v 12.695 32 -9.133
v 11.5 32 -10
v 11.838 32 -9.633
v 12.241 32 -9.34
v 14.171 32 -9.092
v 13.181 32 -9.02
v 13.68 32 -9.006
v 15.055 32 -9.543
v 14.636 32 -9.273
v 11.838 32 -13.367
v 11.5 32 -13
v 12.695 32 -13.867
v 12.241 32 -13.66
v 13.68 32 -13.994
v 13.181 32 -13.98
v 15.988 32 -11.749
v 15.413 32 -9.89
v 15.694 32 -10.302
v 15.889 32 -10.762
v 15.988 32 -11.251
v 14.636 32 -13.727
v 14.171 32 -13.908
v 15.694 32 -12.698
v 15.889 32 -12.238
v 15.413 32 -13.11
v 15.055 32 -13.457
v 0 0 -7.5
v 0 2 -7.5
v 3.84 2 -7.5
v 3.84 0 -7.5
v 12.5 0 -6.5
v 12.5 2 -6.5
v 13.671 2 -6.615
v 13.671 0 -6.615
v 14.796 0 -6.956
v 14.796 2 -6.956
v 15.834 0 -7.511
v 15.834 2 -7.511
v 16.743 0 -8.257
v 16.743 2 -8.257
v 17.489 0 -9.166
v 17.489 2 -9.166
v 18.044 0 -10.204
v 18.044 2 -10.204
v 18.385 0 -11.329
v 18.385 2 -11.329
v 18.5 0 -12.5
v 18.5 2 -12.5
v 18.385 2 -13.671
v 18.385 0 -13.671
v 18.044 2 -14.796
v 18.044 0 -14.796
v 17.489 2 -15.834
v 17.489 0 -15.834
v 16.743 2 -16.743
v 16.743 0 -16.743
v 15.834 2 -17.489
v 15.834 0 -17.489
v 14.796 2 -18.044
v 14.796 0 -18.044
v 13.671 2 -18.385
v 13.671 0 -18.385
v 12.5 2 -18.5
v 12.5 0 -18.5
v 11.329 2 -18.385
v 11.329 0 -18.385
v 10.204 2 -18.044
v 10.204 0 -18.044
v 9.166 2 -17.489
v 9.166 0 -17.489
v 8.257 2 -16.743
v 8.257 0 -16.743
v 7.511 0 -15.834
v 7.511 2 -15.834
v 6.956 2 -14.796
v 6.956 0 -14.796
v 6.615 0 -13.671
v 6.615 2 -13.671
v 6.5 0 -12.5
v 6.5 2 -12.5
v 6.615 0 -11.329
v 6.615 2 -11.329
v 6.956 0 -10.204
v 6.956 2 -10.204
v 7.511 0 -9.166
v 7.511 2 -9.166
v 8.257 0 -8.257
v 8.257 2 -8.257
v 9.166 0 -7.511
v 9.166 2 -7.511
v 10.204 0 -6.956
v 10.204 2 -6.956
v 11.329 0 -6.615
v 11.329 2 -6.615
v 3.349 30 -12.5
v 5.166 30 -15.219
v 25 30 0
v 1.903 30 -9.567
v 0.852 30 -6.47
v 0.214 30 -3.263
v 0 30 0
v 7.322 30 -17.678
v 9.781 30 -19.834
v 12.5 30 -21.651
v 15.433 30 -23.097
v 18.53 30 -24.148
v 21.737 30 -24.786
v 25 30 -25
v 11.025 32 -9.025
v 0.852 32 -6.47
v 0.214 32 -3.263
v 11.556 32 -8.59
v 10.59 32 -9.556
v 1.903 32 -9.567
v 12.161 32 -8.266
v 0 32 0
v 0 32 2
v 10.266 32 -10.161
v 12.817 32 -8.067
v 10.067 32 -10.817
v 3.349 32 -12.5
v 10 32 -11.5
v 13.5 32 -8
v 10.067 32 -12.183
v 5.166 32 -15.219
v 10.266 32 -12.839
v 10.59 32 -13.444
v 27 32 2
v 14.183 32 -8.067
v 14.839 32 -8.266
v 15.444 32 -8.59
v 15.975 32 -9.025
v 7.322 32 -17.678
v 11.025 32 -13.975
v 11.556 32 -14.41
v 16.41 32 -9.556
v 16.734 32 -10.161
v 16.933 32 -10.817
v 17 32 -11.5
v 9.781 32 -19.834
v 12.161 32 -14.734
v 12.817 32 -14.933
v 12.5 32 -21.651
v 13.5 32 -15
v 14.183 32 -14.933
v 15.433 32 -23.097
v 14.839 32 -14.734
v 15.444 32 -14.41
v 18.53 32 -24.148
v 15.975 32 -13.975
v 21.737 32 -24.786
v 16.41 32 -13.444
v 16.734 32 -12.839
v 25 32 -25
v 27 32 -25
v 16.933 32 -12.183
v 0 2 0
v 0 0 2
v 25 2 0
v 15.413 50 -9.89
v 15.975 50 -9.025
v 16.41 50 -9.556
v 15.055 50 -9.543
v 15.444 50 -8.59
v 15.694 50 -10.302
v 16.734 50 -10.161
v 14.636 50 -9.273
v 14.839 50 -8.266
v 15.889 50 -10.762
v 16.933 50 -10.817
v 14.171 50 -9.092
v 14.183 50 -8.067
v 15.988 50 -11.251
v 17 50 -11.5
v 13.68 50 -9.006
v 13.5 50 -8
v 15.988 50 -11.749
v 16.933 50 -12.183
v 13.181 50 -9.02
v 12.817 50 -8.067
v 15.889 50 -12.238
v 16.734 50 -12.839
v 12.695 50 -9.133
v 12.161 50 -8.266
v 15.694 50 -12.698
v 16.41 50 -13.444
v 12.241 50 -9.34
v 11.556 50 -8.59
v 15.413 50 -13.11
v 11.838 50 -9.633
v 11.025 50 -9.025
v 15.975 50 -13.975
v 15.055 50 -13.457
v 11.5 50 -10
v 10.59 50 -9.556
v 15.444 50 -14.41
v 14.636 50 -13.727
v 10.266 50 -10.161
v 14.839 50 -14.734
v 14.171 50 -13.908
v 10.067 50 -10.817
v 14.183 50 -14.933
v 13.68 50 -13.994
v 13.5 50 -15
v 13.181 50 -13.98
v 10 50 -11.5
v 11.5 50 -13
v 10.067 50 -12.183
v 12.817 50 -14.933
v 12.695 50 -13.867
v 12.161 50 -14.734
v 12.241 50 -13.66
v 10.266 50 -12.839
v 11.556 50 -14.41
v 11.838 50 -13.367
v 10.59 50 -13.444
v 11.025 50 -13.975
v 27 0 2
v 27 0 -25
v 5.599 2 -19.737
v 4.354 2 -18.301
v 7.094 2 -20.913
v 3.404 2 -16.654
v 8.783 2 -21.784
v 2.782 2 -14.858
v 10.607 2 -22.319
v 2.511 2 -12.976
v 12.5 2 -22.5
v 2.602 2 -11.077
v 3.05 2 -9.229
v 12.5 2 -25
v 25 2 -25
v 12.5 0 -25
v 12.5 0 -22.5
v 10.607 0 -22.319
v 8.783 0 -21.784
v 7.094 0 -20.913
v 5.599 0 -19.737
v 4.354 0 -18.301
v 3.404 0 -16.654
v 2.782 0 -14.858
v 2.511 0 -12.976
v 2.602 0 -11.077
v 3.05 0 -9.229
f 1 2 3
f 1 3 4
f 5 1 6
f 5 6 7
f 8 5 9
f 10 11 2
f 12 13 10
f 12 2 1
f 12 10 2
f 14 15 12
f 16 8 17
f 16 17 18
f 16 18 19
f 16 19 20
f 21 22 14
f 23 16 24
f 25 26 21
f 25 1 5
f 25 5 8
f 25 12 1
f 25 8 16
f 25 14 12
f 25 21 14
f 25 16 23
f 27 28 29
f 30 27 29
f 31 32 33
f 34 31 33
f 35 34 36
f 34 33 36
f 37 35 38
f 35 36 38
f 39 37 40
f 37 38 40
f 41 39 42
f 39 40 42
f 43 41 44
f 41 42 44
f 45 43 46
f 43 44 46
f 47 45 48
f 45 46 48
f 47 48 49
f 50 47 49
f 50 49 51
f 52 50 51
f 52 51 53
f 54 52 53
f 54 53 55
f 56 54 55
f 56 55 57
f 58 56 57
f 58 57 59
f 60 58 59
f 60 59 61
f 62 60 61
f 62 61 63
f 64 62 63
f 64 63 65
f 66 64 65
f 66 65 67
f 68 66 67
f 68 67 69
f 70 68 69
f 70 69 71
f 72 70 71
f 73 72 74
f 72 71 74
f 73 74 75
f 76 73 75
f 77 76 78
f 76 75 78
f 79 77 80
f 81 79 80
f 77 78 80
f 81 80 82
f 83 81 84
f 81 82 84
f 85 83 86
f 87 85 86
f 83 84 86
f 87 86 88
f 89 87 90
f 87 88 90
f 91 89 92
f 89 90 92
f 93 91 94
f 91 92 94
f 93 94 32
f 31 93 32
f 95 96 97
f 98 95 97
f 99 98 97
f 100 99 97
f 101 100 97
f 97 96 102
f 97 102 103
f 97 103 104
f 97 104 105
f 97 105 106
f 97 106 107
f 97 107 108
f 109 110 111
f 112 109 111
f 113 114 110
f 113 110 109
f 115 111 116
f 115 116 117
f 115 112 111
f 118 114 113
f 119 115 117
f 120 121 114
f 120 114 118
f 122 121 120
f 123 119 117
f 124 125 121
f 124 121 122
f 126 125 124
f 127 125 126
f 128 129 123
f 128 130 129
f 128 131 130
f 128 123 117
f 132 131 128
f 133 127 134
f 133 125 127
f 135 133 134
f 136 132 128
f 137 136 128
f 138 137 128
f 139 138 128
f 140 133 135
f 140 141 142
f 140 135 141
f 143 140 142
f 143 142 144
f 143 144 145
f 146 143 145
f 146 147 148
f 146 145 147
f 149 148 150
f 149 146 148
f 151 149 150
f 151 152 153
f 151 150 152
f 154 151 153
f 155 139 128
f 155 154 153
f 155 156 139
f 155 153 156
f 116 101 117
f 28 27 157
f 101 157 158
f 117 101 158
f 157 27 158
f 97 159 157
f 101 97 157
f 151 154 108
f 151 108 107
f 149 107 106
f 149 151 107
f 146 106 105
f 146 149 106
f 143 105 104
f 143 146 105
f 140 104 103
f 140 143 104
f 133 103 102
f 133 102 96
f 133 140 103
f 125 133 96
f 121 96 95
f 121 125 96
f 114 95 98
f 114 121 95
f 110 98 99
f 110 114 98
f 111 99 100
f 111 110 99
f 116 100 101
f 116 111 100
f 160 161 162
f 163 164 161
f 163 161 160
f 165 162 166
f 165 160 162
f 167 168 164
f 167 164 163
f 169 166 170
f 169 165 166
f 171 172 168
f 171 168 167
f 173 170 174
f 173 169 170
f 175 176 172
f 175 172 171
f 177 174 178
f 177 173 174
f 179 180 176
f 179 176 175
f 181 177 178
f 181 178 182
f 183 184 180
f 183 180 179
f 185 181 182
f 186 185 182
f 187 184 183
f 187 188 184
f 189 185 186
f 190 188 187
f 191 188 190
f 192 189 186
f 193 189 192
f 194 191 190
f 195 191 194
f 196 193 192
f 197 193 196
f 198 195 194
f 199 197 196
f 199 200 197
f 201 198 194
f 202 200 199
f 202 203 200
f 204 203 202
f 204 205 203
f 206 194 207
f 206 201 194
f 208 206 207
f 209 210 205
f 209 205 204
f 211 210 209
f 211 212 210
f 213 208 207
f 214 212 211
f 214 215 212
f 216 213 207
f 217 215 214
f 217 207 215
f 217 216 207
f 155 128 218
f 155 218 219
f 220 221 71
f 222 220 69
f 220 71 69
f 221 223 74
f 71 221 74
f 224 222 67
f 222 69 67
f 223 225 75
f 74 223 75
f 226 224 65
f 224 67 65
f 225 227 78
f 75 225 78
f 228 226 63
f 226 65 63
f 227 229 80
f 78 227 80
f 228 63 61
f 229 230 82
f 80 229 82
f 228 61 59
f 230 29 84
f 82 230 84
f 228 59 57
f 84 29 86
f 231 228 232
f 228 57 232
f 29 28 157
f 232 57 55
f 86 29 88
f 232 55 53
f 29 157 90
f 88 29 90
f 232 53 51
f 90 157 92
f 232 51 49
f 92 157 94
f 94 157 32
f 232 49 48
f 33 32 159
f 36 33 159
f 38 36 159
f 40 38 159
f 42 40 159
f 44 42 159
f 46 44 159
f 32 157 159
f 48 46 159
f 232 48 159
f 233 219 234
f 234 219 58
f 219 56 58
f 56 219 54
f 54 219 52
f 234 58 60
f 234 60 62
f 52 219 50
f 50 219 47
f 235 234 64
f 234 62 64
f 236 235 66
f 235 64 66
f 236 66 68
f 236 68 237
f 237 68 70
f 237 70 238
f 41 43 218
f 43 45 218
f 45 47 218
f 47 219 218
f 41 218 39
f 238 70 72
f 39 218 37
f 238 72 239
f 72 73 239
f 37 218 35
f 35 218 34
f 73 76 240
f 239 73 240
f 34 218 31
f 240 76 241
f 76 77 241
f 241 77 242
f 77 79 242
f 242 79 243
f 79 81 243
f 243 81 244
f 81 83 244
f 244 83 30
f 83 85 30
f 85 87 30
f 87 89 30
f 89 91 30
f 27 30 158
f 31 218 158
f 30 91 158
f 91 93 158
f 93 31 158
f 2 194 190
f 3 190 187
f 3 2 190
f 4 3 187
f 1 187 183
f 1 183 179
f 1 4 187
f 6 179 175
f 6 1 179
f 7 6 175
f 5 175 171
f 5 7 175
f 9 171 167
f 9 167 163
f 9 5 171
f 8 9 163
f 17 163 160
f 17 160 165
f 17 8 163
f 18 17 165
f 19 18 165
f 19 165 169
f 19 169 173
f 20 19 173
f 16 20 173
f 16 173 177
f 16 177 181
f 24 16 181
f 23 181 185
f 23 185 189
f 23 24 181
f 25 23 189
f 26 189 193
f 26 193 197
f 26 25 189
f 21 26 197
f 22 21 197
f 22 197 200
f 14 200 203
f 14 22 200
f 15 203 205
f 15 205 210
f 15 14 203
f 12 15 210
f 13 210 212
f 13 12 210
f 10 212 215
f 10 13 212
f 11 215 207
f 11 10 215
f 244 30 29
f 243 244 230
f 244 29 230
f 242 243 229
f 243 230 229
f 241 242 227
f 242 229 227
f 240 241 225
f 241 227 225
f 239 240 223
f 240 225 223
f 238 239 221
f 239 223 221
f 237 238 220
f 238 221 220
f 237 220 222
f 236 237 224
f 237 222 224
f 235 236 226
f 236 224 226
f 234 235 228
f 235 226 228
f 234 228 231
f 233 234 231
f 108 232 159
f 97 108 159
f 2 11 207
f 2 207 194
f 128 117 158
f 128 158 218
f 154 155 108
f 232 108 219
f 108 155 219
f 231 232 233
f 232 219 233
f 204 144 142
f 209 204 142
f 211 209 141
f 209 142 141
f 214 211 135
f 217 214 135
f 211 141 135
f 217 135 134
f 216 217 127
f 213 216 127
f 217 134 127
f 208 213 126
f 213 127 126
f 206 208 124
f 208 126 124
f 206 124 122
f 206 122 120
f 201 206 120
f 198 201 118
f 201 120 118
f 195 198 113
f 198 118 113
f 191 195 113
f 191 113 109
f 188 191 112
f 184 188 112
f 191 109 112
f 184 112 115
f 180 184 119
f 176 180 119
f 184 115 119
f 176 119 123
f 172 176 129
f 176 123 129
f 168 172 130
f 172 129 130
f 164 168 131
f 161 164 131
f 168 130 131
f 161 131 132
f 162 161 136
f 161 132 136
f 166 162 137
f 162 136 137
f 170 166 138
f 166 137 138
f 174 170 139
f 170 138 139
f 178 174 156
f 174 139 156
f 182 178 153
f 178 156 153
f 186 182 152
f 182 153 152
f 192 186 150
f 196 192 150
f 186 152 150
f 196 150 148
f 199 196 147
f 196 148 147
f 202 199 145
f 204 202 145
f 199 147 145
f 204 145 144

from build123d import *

# Parameters (mm, degrees)
SKETCH1_W           = 25
SKETCH1_H           = 2
EXTRUDE_THIN1_DEPTH = 25
SKETCH2_R           = 6.0005
CUT_EXTRUDE1_DEPTH  = 36.411862419
BOSS_EXTRUDE1_DEPTH = 32
BOSS_EXTRUDE2_DEPTH = 2
SKETCH7_R           = 3.5
BOSS_EXTRUDE3_DEPTH = 18


with BuildPart() as part:
    # Sketch1 → Extrude-Thin1 (new body)
    with BuildSketch(Plane.XY):
        with Locations((12.5, 1)):
            Rectangle(SKETCH1_W, SKETCH1_H)
    extrude(amount=-EXTRUDE_THIN1_DEPTH)

    # Sketch2 → Cut-Extrude1 (cut, through all)
    with BuildSketch(Plane(origin=(0, 2, 0), x_dir=(1, 0, 0), z_dir=(0, 1, 0))):
        with BuildLine():
            ThreePointArc((3.839745962, 7.5), (3.839745962, 17.5), (12.5, 22.5))
            Line((12.5, 22.5), (12.5, 25))
            Line((12.5, 25), (0, 25))
            Line((0, 25), (0, 7.5))
            Line((0, 7.5), (3.839745962, 7.5))
        make_face()
        with Locations(Location((12.5, 12.5, 0), (0, 0, 270))):
            Circle(SKETCH2_R)
    extrude(amount=-CUT_EXTRUDE1_DEPTH, mode=Mode.SUBTRACT)

    # Sketch4 → Boss-Extrude1 (add)
    with BuildSketch(Plane.XZ):
        Polygon((0, 0), (0, 2), (27, 2), (27, -25), (25, -25), (25, 0), align=None)
    extrude(amount=-BOSS_EXTRUDE1_DEPTH)

    # Sketch6 → Boss-Extrude2 (add)
    with BuildSketch(Plane(origin=(0, 32, 0), x_dir=(1, 0, 0), z_dir=(0, 1, 0))):
        with BuildLine():
            Line((0, 0), (25, 0))
            Line((25, 0), (25, 25))
            ThreePointArc((25, 25), (7.32233047, 17.67766953), (0, 0))
        make_face()
    extrude(amount=-BOSS_EXTRUDE2_DEPTH)

    # Sketch7 → Boss-Extrude3 (add)
    with BuildSketch(Plane(origin=(0, 32, 0), x_dir=(1, 0, 0), z_dir=(0, 1, 0))):
        with Locations(Location((13.5, 11.5, 0), (0, 0, 90))):
            Circle(SKETCH7_R)
        with BuildLine():
            Line((11.5, 13), (11.5, 10))
            ThreePointArc((11.5, 10), (16, 11.5), (11.5, 13))
        make_face(mode=Mode.SUBTRACT)
    extrude(amount=BOSS_EXTRUDE3_DEPTH)


solid = part.part
